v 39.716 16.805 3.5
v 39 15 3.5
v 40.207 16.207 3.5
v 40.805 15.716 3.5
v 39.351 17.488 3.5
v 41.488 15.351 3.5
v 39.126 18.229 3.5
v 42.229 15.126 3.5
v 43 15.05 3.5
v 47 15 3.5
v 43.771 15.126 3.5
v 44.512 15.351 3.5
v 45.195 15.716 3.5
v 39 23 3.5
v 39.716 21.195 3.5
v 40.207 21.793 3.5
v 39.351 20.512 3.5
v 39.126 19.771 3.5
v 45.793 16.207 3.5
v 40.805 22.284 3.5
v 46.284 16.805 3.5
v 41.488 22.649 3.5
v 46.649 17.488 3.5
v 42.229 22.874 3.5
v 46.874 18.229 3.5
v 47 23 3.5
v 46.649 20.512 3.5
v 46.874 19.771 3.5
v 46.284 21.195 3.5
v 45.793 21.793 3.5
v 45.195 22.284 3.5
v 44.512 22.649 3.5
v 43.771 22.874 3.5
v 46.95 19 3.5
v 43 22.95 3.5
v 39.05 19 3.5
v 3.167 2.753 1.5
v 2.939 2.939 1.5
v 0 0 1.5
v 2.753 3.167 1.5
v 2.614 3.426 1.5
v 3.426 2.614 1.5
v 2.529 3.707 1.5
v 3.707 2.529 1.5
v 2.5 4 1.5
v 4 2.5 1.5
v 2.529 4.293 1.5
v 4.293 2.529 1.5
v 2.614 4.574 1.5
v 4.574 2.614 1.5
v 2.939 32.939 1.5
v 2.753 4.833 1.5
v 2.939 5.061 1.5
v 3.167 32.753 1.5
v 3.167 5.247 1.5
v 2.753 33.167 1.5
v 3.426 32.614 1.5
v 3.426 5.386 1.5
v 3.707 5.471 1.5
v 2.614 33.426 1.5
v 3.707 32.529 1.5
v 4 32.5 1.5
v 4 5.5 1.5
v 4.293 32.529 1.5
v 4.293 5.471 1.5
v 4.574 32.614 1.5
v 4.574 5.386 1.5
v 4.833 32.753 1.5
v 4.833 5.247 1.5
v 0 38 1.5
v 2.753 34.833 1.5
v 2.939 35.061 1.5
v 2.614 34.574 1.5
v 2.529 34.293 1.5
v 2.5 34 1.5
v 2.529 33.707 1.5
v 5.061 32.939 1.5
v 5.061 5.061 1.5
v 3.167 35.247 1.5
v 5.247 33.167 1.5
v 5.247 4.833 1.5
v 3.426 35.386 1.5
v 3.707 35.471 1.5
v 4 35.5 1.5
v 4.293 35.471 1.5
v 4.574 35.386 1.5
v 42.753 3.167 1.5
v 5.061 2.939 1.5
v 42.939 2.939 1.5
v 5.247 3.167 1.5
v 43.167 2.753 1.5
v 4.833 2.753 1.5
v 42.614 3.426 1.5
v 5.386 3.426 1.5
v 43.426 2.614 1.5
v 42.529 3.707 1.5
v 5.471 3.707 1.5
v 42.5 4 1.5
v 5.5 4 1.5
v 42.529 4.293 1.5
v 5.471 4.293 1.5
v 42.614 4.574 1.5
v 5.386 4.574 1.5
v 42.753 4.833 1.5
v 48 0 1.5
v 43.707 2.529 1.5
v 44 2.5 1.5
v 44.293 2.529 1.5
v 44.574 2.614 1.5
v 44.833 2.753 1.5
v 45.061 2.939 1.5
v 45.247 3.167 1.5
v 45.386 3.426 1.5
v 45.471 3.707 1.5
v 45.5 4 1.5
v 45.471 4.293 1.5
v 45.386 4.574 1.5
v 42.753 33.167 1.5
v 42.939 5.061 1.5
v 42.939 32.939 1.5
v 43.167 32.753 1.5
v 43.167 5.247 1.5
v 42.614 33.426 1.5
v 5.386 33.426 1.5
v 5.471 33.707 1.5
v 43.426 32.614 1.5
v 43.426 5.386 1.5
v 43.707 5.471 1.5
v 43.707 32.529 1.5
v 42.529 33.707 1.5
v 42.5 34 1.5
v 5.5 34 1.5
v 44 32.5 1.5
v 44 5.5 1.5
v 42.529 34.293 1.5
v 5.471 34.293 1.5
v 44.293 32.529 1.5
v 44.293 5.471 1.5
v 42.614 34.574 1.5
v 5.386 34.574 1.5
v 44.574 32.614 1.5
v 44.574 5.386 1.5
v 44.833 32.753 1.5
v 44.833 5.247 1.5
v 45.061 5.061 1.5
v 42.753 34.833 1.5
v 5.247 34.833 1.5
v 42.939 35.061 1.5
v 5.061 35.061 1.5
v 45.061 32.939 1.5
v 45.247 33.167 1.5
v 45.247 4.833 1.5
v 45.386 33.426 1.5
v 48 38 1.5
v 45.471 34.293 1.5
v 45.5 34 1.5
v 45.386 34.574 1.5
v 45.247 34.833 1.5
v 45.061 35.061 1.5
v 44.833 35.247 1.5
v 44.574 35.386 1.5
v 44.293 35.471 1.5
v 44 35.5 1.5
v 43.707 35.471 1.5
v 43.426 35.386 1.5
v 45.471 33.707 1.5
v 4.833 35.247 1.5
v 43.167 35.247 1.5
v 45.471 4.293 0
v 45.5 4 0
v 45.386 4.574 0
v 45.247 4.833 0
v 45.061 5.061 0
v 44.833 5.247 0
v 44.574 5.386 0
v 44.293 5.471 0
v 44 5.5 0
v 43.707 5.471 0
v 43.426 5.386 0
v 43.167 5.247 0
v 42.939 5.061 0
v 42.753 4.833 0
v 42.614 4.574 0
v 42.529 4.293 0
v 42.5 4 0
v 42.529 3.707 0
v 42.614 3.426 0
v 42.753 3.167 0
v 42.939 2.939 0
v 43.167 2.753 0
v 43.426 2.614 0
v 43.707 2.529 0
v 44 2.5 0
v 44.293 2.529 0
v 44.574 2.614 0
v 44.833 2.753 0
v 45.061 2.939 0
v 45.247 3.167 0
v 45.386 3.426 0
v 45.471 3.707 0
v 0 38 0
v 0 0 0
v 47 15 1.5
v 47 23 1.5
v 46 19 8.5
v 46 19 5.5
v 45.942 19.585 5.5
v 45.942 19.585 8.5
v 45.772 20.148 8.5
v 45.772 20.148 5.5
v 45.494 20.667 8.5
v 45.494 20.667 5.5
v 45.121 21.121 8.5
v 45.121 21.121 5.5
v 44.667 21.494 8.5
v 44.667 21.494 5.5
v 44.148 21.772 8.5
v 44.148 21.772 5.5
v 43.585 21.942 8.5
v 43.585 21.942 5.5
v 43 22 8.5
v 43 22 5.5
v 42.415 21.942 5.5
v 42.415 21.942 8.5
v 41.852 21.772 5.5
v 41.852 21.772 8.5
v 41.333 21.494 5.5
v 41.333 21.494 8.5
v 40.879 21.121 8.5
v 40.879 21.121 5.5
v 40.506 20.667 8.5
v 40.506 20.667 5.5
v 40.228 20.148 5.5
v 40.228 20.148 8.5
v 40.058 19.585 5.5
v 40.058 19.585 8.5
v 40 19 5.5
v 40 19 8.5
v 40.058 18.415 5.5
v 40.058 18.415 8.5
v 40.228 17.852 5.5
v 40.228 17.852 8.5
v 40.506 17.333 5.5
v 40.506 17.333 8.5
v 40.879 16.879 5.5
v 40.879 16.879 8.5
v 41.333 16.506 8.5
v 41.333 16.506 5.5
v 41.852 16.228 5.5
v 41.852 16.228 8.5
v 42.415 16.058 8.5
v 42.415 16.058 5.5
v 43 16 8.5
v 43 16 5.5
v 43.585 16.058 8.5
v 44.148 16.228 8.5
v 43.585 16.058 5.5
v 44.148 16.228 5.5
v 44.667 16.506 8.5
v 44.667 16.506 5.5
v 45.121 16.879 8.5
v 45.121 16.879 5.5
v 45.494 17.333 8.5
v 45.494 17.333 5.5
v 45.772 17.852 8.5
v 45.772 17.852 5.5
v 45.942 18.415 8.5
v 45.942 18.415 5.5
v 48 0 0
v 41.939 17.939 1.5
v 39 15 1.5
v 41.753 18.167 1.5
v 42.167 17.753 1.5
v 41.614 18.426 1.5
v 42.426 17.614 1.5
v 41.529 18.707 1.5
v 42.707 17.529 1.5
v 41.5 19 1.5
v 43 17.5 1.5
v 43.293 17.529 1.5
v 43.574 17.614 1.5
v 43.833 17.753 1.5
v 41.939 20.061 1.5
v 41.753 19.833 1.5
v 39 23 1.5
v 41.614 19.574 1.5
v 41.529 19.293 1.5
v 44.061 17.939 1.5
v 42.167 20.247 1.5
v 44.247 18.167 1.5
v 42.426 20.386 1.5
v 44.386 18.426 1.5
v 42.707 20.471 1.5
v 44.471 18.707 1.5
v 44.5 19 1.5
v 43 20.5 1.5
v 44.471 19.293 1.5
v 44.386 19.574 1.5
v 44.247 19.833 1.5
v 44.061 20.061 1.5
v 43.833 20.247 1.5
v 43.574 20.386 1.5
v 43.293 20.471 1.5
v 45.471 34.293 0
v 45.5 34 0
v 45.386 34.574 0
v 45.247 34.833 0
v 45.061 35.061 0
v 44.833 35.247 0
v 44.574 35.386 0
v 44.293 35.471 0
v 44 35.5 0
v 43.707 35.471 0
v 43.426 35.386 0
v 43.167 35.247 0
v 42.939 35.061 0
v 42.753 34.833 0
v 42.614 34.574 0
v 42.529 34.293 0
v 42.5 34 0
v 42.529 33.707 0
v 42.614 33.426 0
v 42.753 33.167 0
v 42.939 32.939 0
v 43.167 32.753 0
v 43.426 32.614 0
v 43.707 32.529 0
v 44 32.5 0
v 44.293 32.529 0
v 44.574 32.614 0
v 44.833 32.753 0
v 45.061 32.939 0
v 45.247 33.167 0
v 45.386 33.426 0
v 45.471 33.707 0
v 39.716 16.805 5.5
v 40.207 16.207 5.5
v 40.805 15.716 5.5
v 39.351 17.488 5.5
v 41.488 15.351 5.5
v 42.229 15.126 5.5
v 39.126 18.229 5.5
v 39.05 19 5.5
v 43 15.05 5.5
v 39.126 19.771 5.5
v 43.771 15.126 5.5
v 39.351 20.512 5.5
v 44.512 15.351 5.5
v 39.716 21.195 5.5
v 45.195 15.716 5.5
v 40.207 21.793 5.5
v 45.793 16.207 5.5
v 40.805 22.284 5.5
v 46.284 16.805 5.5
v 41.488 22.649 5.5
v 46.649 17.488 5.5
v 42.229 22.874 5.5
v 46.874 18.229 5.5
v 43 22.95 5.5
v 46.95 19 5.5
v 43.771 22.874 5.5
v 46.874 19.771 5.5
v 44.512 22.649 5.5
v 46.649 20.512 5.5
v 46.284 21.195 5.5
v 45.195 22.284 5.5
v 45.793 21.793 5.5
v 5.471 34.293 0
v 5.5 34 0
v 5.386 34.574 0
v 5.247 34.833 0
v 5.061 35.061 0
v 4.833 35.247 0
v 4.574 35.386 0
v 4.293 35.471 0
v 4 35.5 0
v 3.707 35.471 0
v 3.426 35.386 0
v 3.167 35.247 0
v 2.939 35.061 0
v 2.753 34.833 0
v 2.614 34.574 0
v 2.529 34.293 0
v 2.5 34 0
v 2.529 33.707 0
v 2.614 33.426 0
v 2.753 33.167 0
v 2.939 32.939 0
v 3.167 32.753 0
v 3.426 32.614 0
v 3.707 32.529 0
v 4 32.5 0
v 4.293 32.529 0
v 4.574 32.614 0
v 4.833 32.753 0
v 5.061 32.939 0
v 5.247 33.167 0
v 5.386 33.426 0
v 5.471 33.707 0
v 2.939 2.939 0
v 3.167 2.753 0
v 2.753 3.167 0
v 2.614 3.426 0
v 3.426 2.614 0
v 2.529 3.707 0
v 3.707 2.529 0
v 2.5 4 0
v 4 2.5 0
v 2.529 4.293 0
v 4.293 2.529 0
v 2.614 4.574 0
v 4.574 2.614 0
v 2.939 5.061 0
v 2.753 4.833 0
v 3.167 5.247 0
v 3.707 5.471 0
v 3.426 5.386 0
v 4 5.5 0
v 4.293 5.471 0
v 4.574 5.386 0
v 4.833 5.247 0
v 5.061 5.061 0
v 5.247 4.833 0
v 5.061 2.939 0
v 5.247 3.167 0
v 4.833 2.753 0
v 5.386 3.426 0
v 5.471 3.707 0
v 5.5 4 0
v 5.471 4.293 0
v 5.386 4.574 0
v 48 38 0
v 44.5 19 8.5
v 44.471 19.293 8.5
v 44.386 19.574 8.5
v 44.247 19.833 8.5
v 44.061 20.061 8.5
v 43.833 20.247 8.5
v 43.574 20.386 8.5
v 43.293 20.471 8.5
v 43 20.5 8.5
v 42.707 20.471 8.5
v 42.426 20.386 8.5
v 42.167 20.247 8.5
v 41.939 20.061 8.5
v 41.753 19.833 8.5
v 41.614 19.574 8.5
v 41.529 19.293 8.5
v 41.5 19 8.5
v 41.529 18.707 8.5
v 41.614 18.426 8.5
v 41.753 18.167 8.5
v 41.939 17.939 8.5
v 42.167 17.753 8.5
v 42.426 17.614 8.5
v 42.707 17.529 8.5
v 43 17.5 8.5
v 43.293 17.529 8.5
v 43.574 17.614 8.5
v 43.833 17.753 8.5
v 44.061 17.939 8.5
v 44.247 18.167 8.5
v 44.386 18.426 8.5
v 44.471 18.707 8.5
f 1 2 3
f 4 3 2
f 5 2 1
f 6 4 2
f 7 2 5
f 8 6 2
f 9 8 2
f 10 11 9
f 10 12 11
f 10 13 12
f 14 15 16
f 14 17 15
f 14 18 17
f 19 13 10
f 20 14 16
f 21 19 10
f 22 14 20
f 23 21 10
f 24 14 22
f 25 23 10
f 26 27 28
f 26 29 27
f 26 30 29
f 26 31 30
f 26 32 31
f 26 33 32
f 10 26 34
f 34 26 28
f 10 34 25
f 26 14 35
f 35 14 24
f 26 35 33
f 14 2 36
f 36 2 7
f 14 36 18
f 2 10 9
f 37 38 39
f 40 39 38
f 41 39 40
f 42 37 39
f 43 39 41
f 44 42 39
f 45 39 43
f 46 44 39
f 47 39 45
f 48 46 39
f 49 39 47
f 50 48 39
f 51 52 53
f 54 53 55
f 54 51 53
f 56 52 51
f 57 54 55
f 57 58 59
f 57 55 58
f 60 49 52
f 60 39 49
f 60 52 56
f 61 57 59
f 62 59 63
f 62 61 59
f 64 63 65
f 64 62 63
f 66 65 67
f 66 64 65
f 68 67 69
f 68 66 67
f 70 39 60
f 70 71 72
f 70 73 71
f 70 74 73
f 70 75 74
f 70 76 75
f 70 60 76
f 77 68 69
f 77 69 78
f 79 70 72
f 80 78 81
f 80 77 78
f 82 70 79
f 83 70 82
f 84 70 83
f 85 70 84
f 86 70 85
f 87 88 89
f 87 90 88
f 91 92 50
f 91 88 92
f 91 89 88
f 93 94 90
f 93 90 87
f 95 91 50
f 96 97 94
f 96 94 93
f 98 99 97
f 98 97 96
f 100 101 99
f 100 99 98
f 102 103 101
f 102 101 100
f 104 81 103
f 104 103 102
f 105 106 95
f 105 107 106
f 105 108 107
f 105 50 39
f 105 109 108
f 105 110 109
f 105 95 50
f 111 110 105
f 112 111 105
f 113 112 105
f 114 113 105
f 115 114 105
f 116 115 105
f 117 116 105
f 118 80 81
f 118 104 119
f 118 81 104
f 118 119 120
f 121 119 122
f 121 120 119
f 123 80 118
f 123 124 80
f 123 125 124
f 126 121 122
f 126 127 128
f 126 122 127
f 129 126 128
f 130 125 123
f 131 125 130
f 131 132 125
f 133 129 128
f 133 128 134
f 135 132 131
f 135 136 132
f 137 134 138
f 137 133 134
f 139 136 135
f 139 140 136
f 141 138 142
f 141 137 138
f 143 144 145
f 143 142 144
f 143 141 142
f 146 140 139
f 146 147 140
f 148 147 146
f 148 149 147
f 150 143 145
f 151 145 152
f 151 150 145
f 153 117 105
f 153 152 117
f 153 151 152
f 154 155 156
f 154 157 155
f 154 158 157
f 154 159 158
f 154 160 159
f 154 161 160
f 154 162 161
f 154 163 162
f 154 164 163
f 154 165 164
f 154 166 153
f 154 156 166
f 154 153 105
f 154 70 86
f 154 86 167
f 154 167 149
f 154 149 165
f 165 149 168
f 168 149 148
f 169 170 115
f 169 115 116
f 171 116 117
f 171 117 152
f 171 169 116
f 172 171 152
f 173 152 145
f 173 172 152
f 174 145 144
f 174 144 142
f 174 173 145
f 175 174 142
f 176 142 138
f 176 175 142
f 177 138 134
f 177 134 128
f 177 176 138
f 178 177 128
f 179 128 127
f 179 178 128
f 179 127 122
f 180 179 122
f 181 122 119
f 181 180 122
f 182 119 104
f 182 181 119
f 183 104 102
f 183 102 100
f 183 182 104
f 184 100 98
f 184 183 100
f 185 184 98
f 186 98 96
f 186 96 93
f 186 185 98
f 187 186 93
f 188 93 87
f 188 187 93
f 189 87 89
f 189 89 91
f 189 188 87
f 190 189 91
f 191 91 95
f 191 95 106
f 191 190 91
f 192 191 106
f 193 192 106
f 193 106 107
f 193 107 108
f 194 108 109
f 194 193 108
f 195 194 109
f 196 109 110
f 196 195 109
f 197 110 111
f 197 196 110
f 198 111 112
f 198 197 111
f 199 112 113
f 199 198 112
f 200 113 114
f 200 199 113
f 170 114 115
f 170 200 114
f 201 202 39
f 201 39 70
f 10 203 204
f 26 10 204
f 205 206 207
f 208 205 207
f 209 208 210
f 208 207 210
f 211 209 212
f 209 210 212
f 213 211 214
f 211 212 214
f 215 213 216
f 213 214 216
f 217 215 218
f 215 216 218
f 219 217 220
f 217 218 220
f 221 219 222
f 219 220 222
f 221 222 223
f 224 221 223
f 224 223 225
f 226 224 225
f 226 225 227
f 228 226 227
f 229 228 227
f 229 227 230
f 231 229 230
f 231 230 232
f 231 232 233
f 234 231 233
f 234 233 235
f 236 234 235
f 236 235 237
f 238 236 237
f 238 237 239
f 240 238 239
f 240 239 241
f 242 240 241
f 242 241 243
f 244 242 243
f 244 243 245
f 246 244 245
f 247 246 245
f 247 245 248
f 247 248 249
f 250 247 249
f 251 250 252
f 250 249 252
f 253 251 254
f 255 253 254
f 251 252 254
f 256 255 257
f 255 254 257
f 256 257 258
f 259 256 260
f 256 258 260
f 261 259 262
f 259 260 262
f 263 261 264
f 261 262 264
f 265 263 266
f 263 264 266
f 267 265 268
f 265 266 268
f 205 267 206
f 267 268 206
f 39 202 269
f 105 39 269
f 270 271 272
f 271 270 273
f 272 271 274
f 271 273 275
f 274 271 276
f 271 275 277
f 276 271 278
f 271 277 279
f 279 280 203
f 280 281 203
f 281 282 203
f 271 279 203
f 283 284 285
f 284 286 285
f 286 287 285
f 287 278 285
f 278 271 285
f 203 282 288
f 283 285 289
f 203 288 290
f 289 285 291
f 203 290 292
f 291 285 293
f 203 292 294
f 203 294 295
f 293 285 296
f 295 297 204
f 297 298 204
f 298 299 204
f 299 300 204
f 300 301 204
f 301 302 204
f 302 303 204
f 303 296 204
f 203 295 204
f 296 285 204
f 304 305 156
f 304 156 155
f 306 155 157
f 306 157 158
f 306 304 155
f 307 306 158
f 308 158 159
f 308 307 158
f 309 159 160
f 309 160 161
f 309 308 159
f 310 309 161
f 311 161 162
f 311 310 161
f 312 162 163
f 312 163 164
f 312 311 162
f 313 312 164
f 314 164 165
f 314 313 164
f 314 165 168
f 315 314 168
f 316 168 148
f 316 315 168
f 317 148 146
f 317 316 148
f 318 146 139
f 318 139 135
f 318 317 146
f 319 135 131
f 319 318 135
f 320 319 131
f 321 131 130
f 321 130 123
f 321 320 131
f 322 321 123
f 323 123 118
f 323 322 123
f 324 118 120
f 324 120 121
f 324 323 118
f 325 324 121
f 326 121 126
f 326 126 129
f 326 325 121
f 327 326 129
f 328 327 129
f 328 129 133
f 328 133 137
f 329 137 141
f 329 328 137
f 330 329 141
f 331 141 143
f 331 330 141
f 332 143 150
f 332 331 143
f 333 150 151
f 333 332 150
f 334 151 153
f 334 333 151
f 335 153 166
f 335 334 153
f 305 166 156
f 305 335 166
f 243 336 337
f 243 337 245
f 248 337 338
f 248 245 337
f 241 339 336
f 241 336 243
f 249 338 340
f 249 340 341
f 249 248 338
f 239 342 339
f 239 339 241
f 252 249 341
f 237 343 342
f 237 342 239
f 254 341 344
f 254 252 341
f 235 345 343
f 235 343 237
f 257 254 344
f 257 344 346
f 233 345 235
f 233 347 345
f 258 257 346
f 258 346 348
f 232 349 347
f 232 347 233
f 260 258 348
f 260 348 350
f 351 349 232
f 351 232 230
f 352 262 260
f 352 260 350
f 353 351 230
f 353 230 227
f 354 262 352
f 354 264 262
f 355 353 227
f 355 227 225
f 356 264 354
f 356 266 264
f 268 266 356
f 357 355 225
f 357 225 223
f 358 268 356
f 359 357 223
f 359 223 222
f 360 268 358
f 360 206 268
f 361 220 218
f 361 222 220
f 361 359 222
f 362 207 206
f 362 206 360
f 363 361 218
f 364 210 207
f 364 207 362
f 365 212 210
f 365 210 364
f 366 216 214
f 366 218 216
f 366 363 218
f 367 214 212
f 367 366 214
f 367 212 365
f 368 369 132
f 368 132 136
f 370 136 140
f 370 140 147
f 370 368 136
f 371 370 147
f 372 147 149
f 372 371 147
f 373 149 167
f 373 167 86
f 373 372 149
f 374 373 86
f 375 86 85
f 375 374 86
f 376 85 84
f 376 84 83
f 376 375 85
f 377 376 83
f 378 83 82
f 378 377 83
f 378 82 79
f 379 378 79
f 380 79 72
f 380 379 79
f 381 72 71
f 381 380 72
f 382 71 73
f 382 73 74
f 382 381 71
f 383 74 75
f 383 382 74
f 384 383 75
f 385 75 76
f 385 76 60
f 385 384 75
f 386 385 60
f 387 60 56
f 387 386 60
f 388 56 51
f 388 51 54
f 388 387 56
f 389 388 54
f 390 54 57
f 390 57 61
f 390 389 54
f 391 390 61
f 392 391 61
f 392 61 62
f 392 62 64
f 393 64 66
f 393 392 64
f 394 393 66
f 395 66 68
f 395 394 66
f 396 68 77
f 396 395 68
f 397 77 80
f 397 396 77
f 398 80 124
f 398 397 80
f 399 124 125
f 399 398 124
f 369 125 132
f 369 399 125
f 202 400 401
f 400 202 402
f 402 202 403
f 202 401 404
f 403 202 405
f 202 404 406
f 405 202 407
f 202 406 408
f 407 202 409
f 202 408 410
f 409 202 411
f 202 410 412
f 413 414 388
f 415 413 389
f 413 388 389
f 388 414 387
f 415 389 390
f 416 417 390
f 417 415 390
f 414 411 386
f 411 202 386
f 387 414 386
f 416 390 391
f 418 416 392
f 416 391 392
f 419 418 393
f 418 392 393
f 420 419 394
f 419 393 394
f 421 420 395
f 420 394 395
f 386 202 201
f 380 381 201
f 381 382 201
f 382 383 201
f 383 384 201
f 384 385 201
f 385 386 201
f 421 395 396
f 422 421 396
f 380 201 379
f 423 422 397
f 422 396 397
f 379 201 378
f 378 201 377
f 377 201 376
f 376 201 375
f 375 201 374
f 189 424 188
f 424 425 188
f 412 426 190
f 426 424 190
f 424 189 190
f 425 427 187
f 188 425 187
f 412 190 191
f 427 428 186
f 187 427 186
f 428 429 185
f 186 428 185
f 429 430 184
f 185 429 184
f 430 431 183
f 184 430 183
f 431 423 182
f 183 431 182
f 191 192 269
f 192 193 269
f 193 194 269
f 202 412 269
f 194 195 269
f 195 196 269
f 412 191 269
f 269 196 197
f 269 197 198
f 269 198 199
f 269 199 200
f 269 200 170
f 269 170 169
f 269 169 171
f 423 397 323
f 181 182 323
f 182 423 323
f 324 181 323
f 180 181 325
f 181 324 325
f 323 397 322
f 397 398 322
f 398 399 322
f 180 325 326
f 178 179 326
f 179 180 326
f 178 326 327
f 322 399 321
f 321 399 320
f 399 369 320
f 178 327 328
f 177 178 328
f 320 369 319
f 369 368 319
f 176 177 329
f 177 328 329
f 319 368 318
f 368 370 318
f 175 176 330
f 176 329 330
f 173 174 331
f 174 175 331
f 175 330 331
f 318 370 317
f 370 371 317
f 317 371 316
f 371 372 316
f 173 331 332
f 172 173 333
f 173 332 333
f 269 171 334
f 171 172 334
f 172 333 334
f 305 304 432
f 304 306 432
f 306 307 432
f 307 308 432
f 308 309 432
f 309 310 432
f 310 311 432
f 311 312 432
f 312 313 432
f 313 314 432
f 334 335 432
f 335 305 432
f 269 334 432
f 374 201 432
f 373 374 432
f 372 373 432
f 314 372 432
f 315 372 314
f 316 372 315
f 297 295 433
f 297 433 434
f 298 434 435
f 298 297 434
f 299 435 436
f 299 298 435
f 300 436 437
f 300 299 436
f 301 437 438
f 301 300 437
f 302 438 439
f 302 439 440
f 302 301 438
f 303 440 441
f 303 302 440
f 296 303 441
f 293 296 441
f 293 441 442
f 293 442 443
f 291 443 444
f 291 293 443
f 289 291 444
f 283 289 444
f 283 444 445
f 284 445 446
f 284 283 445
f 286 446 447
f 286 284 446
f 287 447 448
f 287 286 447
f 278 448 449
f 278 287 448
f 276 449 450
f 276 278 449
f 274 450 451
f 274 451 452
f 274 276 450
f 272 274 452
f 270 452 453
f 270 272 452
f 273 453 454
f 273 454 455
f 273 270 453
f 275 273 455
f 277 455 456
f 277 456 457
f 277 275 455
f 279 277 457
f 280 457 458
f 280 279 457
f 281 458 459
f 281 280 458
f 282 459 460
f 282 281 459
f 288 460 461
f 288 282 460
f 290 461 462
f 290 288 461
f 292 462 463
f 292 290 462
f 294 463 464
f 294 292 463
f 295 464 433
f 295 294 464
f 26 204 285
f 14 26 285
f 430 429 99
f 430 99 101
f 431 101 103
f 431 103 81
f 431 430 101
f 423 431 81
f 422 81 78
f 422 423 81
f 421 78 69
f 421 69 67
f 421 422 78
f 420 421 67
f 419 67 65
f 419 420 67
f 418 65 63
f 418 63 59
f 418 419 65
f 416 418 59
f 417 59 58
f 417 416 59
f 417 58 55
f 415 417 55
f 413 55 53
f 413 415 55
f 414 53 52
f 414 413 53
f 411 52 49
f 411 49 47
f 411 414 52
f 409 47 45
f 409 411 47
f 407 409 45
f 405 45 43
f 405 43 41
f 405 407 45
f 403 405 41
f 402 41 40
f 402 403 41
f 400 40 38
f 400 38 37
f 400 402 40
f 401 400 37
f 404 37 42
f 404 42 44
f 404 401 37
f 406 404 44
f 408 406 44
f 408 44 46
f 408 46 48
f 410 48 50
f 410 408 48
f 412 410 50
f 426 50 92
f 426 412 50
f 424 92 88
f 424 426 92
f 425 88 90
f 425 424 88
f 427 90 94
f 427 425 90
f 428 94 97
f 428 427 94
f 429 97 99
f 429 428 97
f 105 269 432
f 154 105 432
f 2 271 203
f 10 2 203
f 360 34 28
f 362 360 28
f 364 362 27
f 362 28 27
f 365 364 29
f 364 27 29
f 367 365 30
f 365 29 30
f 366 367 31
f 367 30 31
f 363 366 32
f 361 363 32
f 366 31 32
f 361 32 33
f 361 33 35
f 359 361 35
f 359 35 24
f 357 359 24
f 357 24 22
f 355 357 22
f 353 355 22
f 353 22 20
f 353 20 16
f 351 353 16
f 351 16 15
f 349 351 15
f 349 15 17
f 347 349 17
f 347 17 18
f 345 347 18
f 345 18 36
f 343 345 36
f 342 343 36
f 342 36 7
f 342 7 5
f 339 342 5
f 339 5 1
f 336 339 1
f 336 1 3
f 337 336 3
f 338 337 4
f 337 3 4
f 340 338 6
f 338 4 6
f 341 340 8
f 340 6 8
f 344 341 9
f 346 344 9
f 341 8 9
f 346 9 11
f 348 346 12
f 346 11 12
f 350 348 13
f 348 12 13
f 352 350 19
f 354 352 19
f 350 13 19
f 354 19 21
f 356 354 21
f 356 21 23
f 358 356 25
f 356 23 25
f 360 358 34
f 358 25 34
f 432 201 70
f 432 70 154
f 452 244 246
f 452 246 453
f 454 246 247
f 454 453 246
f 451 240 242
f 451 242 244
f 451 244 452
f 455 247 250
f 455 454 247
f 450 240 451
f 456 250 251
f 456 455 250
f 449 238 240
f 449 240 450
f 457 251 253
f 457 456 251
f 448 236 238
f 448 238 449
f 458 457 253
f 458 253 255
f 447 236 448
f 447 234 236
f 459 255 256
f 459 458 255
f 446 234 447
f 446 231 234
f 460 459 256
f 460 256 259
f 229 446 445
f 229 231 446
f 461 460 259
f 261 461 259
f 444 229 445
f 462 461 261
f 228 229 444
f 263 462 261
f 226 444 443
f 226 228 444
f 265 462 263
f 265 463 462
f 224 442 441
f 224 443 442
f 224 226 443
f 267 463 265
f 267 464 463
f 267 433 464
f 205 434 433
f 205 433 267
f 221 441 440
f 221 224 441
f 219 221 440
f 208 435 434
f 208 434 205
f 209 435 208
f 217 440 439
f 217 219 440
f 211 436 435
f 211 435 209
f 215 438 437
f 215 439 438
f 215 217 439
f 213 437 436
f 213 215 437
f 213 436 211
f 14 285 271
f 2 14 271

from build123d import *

# Parameters (mm, degrees)
F0_W     = 48
F0_H     = 38
F0_R     = 1.5
F1_DEPTH = 1.5
F2_R     = 3.95
F3_DEPTH = 2
F2_R_2   = 3
F4_DEPTH = 4
F2_R_3   = 1.5
F5_DEPTH = 7


with BuildPart() as f1:
    # F0 (on Top) → F1 (new body)
    with BuildSketch(Plane.XY):
        with Locations((24, 19)):
            Rectangle(F0_W, F0_H)
        with Locations((4, 4)):
            Circle(F0_R, mode=Mode.SUBTRACT)
        with Locations((44, 4)):
            Circle(F0_R, mode=Mode.SUBTRACT)
        with Locations((4, 34)):
            Circle(F0_R, mode=Mode.SUBTRACT)
        with Locations((44, 34)):
            Circle(F0_R, mode=Mode.SUBTRACT)
    extrude(amount=F1_DEPTH)


with BuildPart() as f3:
    # F2 (on face) → F3 (new body)
    with BuildSketch(Plane.XY.offset(1.5)):
        Polygon((47, 15), (47, 19), (47, 23), (39, 23), (39, 15), align=None)
        with Locations((43, 19)):
            Circle(F2_R, mode=Mode.SUBTRACT)
    extrude(amount=F3_DEPTH)

    # F2 (on face) → F4 (join)
    with BuildSketch(Plane.XY.offset(1.5)):
        with Locations((43, 19)):
            Circle(F2_R)
        with Locations((43, 19)):
            Circle(F2_R_2, mode=Mode.SUBTRACT)
    extrude(amount=F4_DEPTH)

    # F2 (on face) → F5 (join)
    with BuildSketch(Plane.XY.offset(1.5)):
        with Locations((43, 19)):
            Circle(F2_R_2)
        with Locations((43, 19)):
            Circle(F2_R_3, mode=Mode.SUBTRACT)
    extrude(amount=F5_DEPTH)


solid = Compound([f1.part, f3.part])
